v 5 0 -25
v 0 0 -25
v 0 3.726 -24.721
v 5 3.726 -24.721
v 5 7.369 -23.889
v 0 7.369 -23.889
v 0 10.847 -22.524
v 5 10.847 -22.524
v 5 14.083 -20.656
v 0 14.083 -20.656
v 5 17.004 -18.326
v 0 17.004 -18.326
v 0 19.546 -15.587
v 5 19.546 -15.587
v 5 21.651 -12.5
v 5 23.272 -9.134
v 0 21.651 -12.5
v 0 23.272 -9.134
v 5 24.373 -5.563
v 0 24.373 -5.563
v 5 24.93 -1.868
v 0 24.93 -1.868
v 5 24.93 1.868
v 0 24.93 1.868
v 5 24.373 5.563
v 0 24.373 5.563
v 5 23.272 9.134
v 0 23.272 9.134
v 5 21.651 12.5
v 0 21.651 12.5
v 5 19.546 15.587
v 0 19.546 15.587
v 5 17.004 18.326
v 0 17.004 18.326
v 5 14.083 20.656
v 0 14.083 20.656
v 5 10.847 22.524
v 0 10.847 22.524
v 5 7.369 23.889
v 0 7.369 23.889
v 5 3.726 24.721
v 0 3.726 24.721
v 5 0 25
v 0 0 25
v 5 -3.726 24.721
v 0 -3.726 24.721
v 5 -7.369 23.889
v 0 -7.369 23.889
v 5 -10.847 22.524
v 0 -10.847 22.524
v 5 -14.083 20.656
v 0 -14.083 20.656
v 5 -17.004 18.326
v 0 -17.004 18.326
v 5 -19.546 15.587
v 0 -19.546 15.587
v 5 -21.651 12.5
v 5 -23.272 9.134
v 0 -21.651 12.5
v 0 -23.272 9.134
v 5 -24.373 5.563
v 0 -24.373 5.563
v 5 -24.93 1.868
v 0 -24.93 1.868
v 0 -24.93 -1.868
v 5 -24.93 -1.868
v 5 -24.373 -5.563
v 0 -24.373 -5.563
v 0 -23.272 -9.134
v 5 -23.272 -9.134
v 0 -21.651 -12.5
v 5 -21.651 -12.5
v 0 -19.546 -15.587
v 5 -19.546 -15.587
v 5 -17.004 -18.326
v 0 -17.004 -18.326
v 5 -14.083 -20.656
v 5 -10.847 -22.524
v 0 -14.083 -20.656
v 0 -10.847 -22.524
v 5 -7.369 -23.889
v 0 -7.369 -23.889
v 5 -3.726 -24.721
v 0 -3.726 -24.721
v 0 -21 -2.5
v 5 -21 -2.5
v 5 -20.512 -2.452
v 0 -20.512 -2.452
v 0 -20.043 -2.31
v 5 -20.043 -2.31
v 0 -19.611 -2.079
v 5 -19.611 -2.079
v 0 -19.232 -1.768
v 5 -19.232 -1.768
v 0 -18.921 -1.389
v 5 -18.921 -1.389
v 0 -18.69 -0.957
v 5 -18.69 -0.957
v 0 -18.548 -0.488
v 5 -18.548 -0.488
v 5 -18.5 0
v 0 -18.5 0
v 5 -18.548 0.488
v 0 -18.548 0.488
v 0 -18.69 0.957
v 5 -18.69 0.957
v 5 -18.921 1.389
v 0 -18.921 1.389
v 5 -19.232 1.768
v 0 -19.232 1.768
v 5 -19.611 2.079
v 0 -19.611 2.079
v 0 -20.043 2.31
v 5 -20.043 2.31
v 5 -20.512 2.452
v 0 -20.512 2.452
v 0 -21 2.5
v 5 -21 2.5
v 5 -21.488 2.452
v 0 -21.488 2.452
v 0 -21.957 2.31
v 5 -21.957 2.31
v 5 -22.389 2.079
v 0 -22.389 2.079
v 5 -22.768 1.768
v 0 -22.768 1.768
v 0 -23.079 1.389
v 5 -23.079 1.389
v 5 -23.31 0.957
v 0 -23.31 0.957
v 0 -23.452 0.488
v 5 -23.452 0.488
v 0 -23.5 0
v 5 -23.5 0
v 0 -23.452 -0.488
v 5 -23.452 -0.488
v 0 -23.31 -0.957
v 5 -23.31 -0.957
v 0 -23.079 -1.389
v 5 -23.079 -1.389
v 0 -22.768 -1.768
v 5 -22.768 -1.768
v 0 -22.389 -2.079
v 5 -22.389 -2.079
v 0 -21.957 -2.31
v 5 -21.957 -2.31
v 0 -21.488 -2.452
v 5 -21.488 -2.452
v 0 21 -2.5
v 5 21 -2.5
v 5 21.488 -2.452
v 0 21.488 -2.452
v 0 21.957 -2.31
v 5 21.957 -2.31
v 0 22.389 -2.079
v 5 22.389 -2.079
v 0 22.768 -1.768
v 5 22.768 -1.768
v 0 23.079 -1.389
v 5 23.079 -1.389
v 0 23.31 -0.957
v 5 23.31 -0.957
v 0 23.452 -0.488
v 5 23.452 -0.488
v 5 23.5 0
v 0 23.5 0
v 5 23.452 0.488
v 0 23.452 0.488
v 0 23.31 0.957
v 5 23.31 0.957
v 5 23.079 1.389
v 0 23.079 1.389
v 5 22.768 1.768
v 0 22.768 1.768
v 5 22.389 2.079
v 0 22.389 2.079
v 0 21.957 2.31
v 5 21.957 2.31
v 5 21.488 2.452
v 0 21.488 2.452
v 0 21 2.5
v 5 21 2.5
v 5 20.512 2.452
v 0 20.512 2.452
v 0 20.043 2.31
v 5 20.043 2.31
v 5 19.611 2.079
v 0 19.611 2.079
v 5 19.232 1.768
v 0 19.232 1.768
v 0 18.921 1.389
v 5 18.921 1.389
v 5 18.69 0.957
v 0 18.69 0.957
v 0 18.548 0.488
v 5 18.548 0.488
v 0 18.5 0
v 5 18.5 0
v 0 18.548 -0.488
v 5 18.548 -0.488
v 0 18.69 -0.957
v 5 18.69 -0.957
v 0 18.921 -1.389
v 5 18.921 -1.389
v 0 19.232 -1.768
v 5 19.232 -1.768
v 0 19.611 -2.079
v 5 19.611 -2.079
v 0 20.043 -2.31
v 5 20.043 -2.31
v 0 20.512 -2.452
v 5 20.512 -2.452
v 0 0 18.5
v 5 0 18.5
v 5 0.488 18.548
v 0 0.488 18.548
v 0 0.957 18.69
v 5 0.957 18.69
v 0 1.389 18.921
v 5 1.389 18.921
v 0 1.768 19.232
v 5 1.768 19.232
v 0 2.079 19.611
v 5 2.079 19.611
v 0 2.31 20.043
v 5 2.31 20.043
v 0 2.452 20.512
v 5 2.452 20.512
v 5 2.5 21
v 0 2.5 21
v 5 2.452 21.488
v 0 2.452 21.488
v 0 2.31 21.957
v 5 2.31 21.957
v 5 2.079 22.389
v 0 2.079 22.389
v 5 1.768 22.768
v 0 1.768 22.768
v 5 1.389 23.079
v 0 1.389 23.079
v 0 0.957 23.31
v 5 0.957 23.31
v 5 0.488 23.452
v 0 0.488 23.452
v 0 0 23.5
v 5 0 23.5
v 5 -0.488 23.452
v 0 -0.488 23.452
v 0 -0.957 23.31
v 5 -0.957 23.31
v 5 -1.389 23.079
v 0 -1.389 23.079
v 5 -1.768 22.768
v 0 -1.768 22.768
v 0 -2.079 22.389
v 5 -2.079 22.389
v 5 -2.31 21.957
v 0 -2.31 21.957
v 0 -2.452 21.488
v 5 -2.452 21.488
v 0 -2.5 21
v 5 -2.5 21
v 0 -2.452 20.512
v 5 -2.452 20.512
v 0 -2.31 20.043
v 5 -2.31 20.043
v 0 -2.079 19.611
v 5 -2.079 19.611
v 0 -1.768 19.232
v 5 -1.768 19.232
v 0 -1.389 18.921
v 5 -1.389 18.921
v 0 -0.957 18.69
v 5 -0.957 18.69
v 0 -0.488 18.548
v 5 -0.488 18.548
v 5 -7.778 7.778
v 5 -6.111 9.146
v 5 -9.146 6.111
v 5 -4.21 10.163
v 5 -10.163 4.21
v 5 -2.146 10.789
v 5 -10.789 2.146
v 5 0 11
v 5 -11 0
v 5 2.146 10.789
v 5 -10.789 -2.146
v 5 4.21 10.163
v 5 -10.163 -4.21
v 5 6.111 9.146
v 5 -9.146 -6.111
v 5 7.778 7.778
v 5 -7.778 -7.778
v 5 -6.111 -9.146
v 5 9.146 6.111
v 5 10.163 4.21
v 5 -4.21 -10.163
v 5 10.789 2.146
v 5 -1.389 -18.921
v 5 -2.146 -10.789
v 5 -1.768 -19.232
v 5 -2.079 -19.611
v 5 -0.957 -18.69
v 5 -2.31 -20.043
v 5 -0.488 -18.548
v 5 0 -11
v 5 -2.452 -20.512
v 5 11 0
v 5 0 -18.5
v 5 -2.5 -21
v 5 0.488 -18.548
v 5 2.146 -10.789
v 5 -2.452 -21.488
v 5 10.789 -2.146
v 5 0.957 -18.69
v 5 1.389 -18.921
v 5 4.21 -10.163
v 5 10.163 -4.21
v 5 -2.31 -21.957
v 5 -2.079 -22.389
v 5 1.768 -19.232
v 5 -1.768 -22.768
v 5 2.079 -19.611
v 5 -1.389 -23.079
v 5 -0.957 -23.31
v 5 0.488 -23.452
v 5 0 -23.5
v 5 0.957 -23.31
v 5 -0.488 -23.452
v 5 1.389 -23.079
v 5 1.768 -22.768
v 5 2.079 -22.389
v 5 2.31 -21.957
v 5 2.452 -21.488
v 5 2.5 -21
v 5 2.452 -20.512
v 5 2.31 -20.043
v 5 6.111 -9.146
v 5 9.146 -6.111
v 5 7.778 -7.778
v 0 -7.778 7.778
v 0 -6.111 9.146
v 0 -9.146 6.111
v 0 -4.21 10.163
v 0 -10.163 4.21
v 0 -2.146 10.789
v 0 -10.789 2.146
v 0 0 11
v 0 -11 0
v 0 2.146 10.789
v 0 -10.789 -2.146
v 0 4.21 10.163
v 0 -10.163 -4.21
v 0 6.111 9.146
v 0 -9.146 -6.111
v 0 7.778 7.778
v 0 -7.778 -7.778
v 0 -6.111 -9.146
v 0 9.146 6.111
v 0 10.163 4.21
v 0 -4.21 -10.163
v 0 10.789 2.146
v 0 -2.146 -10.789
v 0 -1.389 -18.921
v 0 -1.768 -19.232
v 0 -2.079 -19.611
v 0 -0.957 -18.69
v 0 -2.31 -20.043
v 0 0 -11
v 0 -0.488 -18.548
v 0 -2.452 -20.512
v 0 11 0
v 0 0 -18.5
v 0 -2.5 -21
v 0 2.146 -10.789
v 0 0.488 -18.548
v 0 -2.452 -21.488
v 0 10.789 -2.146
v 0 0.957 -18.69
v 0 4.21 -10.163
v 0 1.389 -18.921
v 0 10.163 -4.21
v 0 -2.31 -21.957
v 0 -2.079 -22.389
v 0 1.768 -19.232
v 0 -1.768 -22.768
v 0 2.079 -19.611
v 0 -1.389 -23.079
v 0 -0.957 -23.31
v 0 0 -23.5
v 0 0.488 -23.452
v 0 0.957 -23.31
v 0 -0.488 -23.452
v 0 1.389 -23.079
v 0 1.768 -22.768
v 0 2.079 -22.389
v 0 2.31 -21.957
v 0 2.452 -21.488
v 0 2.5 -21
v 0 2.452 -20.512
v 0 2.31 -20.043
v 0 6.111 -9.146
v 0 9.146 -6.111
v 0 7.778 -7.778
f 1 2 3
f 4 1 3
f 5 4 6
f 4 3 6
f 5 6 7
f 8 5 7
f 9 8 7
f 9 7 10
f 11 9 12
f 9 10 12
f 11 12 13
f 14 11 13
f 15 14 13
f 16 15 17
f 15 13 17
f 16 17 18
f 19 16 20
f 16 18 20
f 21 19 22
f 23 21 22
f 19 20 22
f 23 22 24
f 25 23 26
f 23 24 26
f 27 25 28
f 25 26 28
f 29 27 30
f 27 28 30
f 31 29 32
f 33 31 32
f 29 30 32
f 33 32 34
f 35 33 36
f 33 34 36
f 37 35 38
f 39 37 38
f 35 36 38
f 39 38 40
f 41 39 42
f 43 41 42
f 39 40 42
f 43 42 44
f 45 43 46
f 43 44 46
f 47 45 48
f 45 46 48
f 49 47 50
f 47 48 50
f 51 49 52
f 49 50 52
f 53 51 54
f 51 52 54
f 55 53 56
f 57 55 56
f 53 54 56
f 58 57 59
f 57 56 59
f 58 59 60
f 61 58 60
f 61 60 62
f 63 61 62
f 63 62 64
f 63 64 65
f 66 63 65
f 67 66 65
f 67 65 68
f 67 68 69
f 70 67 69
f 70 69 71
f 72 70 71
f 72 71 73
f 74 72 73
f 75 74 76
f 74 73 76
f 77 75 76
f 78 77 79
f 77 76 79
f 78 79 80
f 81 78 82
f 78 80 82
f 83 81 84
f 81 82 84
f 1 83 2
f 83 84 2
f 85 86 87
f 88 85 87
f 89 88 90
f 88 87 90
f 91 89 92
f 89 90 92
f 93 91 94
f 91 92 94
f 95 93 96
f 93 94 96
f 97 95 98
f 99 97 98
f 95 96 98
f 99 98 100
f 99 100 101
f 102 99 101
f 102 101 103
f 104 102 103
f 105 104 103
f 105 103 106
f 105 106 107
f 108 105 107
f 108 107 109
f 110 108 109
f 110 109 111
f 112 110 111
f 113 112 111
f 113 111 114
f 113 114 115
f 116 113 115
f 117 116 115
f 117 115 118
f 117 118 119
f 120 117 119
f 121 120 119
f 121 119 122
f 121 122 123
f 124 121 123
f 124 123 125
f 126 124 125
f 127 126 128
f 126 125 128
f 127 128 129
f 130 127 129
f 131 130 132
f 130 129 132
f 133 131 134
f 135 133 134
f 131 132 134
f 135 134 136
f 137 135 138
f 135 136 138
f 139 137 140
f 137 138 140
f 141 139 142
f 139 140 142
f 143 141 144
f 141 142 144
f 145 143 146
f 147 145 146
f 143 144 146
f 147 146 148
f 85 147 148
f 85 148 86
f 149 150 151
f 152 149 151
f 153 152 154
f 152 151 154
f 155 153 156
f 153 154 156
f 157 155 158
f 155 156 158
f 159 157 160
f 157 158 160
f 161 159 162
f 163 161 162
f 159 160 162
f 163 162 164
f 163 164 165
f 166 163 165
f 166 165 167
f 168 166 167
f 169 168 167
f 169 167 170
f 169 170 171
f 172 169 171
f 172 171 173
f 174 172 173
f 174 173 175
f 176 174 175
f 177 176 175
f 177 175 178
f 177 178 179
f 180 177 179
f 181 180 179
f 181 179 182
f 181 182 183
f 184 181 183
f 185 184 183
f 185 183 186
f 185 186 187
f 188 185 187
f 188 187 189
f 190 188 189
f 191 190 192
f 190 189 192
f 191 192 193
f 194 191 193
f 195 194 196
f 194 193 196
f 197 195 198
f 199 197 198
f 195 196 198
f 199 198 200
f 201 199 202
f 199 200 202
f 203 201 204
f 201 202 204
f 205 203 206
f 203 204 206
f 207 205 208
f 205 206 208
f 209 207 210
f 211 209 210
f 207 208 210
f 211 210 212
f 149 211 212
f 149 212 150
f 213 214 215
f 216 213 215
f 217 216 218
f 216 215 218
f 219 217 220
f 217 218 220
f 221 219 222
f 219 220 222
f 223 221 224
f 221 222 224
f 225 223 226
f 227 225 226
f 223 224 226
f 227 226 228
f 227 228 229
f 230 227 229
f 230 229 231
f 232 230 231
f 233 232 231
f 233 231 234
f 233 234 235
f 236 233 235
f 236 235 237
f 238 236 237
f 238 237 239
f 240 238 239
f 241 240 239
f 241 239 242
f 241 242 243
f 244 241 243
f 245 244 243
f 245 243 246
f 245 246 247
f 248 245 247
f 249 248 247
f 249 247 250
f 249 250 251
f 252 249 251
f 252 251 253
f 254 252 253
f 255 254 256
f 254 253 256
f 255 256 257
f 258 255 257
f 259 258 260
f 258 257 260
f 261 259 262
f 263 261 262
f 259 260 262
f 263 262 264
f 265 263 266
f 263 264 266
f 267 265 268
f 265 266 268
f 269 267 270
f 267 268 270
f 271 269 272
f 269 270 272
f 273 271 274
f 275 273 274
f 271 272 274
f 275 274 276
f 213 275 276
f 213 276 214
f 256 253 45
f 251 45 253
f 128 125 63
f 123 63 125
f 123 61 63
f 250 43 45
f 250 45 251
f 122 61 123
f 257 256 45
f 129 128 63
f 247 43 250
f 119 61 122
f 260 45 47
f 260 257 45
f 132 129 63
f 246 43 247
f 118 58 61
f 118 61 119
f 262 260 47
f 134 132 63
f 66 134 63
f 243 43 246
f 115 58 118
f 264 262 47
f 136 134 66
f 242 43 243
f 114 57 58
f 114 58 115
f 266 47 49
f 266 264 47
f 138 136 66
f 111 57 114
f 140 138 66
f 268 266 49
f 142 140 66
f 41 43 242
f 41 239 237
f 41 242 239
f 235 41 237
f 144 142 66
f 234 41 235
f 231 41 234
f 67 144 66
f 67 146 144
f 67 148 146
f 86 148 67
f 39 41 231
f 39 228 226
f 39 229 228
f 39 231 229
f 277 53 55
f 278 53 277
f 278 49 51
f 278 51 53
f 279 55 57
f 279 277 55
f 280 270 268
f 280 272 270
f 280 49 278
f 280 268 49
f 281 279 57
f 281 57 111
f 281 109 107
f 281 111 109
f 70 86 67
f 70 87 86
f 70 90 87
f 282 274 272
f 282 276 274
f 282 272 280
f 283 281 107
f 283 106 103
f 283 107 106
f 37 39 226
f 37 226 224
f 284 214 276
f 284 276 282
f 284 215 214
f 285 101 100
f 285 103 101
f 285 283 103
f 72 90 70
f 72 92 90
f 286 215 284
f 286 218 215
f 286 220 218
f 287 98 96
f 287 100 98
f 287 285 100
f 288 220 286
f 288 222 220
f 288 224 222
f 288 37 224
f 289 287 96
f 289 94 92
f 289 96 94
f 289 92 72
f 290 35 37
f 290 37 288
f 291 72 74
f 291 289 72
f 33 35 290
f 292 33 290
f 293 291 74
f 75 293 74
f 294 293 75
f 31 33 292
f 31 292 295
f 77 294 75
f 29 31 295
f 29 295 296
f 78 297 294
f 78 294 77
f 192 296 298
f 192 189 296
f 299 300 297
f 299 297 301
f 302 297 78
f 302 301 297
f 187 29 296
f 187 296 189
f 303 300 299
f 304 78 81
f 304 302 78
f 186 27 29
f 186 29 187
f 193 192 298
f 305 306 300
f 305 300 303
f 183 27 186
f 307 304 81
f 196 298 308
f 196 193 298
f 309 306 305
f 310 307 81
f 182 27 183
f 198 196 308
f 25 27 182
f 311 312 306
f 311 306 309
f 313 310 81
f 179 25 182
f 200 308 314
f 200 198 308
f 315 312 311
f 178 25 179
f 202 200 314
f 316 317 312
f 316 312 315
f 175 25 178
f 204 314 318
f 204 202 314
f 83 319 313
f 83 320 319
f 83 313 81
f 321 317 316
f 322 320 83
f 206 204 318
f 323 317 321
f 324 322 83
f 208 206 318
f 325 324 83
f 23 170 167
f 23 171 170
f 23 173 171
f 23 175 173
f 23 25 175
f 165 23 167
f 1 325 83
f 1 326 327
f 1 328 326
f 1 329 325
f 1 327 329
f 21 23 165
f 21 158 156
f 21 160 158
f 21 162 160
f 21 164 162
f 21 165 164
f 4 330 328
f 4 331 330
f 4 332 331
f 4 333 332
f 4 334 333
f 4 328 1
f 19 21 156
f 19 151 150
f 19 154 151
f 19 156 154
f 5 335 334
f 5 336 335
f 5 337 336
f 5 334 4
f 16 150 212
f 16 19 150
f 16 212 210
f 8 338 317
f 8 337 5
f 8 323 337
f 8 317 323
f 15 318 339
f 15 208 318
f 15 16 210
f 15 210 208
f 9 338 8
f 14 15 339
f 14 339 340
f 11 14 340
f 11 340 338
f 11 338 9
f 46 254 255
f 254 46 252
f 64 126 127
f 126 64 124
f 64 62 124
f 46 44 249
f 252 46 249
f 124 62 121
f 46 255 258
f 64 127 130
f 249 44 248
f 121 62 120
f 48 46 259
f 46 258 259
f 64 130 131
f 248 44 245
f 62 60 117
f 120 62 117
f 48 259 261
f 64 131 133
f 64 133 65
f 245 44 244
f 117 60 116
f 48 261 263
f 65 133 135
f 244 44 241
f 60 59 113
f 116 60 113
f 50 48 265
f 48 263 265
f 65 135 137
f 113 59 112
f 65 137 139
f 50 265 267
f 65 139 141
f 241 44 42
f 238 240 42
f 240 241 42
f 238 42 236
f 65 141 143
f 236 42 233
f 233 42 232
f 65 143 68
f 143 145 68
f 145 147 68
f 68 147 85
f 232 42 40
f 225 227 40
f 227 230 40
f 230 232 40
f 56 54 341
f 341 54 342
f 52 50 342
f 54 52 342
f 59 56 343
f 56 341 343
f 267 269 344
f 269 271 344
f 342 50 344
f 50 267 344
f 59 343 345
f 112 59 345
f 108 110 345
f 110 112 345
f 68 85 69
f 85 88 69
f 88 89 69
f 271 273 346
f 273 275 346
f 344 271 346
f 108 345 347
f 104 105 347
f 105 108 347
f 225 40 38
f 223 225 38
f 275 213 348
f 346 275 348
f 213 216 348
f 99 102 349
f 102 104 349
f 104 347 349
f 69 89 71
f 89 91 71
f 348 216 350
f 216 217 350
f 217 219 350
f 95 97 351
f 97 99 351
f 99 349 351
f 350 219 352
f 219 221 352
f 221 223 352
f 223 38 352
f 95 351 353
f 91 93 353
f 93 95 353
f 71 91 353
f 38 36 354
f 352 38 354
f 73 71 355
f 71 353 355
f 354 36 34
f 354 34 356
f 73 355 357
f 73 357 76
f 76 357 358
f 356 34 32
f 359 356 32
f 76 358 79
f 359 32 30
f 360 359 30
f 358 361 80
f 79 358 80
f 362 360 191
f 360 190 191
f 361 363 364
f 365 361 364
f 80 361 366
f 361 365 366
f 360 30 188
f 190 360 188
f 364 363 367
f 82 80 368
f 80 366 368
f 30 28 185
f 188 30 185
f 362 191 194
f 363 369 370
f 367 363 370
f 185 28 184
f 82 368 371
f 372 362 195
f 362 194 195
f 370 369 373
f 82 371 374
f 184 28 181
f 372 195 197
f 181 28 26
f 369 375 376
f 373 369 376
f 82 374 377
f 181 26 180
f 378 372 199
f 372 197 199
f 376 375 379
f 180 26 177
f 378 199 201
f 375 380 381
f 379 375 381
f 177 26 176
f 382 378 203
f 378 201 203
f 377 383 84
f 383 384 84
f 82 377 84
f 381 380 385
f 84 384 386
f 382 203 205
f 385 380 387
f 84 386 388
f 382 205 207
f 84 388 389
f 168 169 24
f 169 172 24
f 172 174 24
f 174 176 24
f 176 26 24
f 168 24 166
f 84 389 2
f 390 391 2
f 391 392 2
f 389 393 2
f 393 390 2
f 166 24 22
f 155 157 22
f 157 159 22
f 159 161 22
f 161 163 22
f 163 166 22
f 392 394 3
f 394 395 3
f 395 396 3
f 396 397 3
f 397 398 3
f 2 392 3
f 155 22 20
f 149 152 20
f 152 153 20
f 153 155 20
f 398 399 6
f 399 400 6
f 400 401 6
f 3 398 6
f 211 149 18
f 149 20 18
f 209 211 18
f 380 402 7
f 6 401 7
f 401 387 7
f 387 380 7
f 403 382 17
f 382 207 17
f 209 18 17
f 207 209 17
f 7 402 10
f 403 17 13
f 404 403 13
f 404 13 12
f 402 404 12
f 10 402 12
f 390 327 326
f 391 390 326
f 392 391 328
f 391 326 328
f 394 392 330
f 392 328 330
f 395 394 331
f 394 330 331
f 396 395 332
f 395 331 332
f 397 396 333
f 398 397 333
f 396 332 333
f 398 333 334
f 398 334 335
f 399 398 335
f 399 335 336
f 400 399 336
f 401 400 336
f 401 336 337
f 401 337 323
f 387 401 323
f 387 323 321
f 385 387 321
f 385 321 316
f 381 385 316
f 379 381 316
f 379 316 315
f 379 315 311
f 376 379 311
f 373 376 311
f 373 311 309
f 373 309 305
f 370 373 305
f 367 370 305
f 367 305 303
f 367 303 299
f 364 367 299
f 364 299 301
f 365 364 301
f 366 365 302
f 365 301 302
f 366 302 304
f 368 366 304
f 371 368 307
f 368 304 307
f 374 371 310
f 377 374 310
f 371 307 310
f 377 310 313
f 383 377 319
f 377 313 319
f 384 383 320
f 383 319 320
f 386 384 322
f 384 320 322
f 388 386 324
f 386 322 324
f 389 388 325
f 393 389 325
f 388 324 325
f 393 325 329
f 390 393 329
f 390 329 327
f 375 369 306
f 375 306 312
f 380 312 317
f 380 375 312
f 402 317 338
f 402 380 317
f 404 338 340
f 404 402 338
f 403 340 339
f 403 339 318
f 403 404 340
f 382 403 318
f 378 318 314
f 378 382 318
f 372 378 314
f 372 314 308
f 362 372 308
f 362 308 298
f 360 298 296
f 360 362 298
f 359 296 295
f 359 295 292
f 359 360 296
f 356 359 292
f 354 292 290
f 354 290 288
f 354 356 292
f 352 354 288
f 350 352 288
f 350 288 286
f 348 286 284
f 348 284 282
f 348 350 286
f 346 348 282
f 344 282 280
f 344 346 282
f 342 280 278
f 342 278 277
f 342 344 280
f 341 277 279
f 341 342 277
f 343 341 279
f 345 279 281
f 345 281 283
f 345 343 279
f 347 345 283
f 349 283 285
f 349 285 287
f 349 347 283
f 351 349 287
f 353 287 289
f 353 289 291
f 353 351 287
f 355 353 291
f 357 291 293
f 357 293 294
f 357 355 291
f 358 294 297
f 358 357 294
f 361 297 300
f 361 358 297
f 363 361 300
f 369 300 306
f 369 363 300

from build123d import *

# Parameters (mm, degrees)
CROQUIS1_R              = 25
CROQUIS1_R_2            = 11
SALIENTE_EXTRUIR1_DEPTH = 5
CROQUIS2_R              = 2.5
CORTAR_EXTRUIR1_DEPTH   = 10


with BuildPart() as part:
    # Croquis1 → Saliente-Extruir1 (new body)
    with BuildSketch(Plane(origin=(0, 0, 0), x_dir=(0, 0, -1), z_dir=(1, 0, 0))):
        Circle(CROQUIS1_R)
        Circle(CROQUIS1_R_2, mode=Mode.SUBTRACT)
    extrude(amount=SALIENTE_EXTRUIR1_DEPTH)

    # Croquis2 → Cortar-Extruir1 (cut)
    with BuildSketch(Plane(origin=(5, 0, 0), x_dir=(0, 0, -1), z_dir=(1, 0, 0))):
        with Locations((0, 21)):
            Circle(CROQUIS2_R)
        with Locations((21, 0)):
            Circle(CROQUIS2_R)
        with Locations((0, -21)):
            Circle(CROQUIS2_R)
        with Locations((-21, 0)):
            Circle(CROQUIS2_R)
    extrude(amount=-CORTAR_EXTRUIR1_DEPTH, mode=Mode.SUBTRACT)


solid = part.part
